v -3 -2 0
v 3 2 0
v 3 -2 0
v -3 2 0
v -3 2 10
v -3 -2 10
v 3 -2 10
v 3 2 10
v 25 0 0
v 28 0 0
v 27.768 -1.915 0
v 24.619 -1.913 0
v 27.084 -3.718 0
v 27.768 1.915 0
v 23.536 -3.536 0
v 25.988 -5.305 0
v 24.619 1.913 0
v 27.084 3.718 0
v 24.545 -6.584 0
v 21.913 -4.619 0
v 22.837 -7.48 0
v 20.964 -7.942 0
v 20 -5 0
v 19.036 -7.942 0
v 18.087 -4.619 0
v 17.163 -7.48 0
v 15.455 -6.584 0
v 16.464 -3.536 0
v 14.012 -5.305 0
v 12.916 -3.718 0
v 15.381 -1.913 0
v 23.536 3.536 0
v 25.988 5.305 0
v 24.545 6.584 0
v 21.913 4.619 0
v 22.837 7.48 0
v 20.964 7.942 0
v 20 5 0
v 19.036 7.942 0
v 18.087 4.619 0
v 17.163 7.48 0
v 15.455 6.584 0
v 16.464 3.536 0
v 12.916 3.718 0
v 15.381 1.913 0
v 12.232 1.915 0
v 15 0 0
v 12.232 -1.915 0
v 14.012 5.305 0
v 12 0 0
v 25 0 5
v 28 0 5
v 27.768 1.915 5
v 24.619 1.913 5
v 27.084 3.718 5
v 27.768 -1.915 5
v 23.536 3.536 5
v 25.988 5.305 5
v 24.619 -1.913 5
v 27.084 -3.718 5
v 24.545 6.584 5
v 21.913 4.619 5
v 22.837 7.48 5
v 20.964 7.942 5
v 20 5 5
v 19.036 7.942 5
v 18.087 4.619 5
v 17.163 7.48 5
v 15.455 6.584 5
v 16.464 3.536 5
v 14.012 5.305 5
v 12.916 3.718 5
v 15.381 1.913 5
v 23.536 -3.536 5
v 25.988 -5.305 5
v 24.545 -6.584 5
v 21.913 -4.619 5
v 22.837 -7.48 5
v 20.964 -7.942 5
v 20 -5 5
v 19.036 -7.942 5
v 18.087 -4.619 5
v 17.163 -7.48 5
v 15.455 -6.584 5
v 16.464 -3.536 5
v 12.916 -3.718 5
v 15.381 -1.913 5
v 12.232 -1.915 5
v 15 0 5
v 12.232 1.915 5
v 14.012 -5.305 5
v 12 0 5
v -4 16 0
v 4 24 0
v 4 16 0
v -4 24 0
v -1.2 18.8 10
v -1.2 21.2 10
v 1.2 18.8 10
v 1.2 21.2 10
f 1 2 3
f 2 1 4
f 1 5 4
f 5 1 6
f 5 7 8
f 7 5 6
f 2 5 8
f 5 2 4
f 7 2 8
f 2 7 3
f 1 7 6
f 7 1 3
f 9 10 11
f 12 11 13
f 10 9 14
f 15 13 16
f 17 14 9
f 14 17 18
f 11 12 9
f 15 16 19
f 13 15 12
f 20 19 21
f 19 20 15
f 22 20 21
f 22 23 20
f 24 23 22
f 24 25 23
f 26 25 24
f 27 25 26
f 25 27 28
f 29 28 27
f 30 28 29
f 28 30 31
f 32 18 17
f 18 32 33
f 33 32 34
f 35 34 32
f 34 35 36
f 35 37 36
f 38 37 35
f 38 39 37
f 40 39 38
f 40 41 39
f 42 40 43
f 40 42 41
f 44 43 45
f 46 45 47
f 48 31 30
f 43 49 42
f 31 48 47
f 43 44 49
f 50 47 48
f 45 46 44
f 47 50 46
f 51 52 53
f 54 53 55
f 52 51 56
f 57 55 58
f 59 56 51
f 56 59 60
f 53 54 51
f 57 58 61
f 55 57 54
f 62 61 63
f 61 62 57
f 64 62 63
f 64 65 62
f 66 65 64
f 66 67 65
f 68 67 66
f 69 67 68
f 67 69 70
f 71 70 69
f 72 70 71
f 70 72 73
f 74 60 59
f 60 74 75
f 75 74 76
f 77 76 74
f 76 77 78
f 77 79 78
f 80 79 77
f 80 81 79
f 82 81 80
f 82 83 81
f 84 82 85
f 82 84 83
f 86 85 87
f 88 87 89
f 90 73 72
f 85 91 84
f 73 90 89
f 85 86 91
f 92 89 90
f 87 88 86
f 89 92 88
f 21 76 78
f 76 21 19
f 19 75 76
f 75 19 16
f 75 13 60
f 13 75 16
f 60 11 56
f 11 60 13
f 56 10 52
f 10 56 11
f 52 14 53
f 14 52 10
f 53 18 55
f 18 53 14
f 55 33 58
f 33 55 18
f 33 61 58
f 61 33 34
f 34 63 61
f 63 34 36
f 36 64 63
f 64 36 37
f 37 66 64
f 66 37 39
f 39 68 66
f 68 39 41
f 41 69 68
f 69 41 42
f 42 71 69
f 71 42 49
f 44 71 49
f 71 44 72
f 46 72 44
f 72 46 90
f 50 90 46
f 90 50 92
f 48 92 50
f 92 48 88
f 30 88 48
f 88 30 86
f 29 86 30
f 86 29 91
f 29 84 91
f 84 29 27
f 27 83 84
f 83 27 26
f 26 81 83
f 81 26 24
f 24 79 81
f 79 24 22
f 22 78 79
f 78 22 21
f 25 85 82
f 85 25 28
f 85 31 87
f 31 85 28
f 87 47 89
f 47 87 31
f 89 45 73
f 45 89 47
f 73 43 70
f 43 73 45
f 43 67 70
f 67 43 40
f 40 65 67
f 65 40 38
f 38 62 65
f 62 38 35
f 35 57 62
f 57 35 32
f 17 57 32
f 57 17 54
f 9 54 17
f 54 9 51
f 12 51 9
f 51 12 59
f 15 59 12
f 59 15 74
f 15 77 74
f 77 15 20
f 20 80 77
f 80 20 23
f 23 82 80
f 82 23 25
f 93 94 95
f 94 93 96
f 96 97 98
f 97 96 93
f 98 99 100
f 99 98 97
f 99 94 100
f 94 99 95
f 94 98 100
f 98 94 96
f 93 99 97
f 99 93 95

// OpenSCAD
// Focused test: linear_extrude of 2D primitives + 2D booleans.
// Exercises csg.LinearExtrude, csg.Polygon (square/circle), and 2D difference.

// plain extrude of a square
linear_extrude(10) square([6, 4], center=true);

// extrude of a 2D difference (ring)
translate([20, 0, 0])
  linear_extrude(5)
    difference() {
      circle(8);
      circle(5);
    }

// extrude with uniform scale (taper)
translate([0, 20, 0])
  linear_extrude(10, scale=0.3) square(8, center=true);
